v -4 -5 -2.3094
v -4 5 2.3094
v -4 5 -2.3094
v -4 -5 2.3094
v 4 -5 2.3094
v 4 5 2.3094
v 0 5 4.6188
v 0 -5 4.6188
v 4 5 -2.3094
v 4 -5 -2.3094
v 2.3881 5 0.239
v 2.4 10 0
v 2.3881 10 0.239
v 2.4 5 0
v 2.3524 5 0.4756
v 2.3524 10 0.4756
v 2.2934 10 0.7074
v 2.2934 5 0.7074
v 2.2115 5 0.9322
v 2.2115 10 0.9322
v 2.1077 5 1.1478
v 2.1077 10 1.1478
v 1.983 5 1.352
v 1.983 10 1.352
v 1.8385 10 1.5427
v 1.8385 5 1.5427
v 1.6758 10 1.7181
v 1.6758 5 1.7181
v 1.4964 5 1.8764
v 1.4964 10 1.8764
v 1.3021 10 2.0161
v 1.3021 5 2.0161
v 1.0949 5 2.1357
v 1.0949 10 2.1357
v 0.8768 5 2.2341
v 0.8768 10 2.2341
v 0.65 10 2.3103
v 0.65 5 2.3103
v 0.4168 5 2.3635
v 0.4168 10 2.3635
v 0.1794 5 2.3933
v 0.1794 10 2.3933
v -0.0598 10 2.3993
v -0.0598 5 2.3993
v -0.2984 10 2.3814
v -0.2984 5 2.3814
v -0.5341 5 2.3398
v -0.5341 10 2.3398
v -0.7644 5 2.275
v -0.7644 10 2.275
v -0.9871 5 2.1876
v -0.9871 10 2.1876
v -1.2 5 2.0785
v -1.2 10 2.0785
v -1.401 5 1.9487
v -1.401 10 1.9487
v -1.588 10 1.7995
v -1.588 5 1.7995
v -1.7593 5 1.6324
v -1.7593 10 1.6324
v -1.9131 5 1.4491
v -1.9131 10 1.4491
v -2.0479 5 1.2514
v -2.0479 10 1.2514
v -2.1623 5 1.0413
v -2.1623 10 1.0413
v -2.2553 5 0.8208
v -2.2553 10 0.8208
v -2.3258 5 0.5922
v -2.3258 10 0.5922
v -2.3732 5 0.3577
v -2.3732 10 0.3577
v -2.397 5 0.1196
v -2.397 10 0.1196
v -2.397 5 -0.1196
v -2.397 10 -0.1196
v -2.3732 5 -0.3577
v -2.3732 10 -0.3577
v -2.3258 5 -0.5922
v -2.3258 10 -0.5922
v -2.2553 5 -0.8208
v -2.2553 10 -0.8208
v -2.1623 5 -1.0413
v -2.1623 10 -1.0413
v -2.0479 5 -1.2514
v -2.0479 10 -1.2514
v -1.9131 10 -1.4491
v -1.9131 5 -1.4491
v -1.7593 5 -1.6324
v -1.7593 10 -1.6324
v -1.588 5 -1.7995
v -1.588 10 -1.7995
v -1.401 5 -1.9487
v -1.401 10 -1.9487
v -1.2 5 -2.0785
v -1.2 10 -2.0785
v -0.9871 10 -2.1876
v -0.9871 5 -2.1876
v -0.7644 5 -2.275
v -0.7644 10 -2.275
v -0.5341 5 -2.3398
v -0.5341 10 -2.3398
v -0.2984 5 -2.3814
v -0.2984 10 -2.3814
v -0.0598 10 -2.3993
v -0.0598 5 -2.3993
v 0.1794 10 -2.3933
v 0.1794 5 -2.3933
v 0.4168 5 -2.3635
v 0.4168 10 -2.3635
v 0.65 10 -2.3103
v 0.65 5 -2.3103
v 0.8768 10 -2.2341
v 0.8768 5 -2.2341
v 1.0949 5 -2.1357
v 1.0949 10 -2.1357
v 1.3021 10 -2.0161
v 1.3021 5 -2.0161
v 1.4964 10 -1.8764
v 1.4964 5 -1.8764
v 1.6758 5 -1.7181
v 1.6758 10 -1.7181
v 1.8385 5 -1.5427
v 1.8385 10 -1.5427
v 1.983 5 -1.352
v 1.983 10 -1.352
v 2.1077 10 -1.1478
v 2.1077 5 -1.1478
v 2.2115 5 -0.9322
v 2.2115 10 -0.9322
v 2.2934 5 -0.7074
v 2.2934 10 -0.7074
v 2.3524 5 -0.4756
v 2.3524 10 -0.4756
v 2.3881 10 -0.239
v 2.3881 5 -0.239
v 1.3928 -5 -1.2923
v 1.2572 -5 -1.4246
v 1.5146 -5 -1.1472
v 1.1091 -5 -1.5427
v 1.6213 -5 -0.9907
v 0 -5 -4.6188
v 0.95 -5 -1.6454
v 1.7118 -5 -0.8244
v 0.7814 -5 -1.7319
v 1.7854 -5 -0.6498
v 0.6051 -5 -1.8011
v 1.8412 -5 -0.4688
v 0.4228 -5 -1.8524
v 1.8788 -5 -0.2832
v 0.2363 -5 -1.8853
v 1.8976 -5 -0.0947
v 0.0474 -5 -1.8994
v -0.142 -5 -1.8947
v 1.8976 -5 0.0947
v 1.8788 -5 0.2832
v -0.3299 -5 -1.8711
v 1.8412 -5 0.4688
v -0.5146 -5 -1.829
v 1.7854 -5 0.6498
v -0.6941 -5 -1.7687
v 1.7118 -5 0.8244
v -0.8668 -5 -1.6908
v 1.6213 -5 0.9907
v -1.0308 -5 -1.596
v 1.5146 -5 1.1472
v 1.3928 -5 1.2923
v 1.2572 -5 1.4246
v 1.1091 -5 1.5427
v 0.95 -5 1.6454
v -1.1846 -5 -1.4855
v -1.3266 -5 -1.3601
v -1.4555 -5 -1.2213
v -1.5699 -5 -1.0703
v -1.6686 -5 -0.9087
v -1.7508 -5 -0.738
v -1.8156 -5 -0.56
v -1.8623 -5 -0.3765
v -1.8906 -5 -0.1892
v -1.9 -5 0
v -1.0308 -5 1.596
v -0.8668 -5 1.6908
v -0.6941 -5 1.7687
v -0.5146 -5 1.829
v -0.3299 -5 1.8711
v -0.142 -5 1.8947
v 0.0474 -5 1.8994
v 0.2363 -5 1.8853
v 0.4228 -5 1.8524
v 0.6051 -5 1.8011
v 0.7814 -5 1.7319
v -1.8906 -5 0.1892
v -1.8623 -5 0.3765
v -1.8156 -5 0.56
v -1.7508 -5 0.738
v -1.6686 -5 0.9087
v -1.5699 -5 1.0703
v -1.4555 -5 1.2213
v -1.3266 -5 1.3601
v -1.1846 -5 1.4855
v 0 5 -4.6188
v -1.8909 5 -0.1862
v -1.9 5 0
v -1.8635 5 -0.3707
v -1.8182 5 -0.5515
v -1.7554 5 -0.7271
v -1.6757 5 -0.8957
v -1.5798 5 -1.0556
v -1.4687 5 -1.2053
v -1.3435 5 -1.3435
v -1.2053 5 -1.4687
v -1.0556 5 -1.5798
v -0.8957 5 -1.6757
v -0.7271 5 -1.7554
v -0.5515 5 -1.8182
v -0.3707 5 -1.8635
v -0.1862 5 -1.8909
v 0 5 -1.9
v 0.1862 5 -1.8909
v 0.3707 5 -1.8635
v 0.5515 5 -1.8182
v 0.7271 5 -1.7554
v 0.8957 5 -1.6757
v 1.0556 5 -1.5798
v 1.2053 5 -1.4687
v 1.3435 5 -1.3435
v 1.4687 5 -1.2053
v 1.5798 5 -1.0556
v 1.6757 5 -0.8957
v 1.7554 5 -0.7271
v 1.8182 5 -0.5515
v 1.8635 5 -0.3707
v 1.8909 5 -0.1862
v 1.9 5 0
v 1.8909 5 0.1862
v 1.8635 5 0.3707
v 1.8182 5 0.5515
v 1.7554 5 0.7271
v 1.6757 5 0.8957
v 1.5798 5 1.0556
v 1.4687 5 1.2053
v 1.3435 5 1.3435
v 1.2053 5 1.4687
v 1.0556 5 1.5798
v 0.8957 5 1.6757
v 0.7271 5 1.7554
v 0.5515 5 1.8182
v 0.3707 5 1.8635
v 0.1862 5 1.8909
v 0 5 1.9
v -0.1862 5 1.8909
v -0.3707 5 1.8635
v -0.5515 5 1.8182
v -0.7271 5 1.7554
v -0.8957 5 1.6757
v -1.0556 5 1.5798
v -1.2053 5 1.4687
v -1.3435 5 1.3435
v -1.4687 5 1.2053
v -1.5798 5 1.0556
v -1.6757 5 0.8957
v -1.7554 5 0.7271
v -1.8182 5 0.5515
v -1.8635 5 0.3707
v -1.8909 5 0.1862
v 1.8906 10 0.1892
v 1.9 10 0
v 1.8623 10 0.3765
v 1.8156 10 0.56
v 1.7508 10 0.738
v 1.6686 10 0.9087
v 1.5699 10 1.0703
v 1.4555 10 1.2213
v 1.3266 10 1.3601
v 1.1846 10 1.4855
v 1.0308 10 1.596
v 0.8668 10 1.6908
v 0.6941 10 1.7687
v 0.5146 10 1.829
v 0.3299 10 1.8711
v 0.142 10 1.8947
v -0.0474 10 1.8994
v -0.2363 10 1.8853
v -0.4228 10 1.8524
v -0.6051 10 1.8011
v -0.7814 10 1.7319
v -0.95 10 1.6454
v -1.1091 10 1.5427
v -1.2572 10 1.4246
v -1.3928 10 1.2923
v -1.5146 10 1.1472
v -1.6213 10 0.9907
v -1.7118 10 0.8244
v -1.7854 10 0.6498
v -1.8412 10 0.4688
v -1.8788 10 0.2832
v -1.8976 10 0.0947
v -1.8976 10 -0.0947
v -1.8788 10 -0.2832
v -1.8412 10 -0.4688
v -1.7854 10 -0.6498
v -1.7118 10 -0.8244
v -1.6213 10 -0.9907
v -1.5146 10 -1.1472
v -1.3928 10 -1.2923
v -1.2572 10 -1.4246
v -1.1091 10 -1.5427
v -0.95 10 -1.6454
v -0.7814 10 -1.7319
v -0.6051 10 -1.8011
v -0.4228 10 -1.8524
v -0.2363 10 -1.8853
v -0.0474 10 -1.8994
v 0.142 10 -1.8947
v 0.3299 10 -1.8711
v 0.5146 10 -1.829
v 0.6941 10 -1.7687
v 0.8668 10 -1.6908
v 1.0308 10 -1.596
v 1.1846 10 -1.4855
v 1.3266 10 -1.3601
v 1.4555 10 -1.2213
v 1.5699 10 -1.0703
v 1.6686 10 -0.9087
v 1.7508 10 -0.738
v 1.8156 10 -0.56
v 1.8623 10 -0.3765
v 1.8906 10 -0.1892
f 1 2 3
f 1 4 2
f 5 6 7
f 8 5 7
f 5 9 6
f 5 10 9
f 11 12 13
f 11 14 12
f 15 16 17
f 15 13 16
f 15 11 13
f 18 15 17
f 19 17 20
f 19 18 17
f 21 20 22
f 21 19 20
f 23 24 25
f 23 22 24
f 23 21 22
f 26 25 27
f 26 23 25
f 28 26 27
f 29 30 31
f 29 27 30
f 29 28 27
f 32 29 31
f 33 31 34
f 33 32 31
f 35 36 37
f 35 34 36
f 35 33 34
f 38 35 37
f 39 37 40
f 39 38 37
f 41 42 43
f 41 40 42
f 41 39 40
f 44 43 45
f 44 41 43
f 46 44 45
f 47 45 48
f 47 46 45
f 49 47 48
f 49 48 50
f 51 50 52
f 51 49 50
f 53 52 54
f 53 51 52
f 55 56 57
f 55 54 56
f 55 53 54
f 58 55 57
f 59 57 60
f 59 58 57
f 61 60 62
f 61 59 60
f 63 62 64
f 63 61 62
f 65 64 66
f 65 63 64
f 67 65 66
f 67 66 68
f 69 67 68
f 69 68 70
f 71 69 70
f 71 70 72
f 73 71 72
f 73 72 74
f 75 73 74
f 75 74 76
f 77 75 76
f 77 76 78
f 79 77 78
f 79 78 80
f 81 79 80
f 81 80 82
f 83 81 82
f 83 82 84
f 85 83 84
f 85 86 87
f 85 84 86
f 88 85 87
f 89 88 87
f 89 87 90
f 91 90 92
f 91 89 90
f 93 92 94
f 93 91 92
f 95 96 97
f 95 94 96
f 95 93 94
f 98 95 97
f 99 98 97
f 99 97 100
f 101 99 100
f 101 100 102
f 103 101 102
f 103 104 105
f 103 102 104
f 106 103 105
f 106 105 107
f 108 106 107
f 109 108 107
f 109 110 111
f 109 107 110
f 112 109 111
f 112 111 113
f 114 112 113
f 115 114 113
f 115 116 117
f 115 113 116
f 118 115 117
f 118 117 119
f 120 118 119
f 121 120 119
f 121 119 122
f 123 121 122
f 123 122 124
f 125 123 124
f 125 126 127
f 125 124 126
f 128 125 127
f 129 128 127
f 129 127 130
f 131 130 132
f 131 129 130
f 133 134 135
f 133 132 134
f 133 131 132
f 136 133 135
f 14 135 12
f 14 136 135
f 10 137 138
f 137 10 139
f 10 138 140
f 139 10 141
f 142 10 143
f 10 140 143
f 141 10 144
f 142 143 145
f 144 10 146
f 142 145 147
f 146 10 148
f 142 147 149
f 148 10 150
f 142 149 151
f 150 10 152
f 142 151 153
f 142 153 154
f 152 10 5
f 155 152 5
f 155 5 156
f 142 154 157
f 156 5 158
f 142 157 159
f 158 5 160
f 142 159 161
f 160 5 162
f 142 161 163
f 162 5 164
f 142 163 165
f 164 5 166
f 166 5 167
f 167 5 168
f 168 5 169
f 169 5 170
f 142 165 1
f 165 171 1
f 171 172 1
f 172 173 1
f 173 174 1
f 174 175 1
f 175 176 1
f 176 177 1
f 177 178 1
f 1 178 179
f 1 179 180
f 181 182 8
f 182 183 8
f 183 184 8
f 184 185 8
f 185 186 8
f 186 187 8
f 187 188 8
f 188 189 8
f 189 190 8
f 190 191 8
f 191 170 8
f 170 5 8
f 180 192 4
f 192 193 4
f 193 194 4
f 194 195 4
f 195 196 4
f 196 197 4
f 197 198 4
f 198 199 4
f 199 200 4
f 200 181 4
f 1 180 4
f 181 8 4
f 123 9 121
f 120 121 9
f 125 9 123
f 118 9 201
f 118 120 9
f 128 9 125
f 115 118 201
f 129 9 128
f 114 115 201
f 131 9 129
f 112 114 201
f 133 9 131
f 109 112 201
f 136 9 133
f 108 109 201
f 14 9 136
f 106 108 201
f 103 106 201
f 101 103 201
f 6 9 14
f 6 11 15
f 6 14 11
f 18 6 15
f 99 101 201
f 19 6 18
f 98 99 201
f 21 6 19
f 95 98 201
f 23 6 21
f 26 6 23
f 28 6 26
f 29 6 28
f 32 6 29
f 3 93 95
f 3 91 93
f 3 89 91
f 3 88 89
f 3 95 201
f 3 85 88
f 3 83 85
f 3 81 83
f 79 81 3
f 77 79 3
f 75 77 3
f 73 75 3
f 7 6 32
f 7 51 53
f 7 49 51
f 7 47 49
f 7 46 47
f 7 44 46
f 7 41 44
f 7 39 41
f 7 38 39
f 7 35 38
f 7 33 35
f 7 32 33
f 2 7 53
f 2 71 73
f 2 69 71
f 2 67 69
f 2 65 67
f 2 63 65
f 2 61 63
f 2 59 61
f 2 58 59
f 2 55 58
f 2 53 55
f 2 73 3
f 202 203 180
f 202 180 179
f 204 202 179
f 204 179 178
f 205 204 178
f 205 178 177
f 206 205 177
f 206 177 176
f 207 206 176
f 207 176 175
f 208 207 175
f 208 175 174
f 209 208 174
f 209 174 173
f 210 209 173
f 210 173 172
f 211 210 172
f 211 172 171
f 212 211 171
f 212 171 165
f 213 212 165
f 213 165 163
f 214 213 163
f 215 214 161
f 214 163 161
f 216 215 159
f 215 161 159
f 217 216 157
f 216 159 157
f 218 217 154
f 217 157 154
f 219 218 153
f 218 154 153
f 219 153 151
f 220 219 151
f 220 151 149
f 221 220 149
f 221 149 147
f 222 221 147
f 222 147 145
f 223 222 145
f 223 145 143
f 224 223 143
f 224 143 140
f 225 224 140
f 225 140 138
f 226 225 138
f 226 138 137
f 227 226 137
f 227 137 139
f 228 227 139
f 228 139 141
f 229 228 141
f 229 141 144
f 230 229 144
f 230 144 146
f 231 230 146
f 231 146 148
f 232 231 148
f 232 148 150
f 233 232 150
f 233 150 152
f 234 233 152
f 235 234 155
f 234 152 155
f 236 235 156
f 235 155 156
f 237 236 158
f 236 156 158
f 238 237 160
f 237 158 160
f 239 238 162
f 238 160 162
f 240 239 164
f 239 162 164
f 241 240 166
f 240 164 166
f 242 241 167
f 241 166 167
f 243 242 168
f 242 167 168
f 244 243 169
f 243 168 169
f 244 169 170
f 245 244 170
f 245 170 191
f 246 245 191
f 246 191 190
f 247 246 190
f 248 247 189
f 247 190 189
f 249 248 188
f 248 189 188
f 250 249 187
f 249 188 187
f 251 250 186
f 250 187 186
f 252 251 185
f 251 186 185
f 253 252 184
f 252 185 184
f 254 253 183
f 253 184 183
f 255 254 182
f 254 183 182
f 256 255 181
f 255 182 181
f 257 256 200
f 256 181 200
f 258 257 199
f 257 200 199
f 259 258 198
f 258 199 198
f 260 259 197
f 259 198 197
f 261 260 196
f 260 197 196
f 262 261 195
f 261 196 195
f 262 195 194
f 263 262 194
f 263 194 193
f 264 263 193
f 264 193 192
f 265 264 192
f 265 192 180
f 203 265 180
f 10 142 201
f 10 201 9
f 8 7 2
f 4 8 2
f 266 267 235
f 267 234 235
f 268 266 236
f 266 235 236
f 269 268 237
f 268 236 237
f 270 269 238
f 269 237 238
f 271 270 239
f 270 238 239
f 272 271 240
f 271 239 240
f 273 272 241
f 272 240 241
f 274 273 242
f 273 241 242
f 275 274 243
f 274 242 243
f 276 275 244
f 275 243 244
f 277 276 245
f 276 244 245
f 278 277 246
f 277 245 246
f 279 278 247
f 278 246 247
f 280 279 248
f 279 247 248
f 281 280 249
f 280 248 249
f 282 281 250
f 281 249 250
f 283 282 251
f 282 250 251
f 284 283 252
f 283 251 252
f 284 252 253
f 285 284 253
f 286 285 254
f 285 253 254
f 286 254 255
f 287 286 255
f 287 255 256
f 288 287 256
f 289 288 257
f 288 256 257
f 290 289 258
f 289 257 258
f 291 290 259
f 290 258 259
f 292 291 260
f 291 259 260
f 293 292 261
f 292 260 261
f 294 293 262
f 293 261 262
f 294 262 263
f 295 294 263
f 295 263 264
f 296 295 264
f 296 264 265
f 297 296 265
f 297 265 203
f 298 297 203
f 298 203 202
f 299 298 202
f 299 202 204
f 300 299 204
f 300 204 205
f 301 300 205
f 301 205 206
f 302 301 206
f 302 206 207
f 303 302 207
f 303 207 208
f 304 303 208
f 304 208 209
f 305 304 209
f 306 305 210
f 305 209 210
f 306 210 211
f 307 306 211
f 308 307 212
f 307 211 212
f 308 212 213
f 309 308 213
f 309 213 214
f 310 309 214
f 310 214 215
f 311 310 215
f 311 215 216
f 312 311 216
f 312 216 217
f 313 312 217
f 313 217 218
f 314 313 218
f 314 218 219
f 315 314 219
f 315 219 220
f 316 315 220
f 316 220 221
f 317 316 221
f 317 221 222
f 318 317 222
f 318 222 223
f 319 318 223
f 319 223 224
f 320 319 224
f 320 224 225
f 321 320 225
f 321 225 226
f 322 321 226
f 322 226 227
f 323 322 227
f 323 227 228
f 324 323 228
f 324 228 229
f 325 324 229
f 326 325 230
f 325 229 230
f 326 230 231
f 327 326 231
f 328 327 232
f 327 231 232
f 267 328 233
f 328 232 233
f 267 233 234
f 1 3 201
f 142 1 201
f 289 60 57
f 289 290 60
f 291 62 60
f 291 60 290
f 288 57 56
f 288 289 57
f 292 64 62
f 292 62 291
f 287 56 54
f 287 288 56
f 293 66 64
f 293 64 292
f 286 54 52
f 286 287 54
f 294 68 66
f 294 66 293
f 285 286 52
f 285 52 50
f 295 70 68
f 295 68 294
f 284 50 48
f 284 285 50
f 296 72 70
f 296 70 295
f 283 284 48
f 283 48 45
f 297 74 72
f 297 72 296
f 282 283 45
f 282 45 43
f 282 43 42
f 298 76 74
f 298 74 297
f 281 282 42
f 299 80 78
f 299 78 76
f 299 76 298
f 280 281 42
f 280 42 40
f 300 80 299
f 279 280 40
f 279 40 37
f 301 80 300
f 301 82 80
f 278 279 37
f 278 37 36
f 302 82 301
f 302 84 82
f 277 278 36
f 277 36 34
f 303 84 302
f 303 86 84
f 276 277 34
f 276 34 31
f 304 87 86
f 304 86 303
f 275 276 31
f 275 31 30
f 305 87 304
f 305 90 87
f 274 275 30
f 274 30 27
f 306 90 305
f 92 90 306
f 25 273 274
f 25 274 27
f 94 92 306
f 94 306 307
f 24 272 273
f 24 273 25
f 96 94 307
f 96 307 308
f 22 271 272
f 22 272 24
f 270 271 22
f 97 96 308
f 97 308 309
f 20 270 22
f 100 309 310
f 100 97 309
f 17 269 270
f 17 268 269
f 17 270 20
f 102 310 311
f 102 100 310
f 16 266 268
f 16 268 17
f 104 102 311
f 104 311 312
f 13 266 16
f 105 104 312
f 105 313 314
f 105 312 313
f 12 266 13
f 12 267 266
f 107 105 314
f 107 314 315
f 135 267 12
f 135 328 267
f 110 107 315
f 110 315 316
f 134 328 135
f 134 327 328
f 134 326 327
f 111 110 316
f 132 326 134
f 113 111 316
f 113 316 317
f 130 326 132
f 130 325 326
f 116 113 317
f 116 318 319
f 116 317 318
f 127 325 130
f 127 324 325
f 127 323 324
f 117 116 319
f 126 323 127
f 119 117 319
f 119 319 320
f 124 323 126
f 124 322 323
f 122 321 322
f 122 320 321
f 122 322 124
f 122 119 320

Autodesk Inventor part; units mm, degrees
ref_plane "YZ Plane" through (0, 0, 0) normal (1, 0, 0) x (0, 1, 0)
ref_plane "XZ Plane" through (0, 0, 0) normal (0, 1, 0) x (-1, 0, 0)
ref_plane "XY Plane" through (0, 0, 0) normal (0, 0, 1) x (1, 0, 0)
sketch "Boceto1" plane through (0, 0, 0) normal (0, 1, 0) x (-1, 0, 0)
  line L0 (0, 4.6188) -> (4, 2.3094)
  line L1 (4, 2.3094) -> (4, -2.3094)
  line L2 (4, -2.3094) -> (0, -4.6188)
  line L3 (0, -4.6188) -> (-4, -2.3094)
  line L4 (-4, -2.3094) -> (-4, 2.3094)
  line L5 (-4, 2.3094) -> (0, 4.6188)
  circle A0 centre (0, 0) radius 1.9
  point P0 (4, 0)
  dimension "d0" = 3.8
  dimension "d2" = 4
extrude "Extrusión1" add sketch "Boceto1" along normal mid plane 10
sketch "Boceto2" plane through (0, 5, 0) normal (0, 1, 0) x (1, 0, 0)
  circle A0 centre (0, 0) radius 1.9 projected
  circle A1 centre (0, 0) radius 2.4
  dimension "d5" = 4.8
extrude "Extrusión2" add sketch "Boceto2" along normal blind 5
properties part number "expansor de conexion"
